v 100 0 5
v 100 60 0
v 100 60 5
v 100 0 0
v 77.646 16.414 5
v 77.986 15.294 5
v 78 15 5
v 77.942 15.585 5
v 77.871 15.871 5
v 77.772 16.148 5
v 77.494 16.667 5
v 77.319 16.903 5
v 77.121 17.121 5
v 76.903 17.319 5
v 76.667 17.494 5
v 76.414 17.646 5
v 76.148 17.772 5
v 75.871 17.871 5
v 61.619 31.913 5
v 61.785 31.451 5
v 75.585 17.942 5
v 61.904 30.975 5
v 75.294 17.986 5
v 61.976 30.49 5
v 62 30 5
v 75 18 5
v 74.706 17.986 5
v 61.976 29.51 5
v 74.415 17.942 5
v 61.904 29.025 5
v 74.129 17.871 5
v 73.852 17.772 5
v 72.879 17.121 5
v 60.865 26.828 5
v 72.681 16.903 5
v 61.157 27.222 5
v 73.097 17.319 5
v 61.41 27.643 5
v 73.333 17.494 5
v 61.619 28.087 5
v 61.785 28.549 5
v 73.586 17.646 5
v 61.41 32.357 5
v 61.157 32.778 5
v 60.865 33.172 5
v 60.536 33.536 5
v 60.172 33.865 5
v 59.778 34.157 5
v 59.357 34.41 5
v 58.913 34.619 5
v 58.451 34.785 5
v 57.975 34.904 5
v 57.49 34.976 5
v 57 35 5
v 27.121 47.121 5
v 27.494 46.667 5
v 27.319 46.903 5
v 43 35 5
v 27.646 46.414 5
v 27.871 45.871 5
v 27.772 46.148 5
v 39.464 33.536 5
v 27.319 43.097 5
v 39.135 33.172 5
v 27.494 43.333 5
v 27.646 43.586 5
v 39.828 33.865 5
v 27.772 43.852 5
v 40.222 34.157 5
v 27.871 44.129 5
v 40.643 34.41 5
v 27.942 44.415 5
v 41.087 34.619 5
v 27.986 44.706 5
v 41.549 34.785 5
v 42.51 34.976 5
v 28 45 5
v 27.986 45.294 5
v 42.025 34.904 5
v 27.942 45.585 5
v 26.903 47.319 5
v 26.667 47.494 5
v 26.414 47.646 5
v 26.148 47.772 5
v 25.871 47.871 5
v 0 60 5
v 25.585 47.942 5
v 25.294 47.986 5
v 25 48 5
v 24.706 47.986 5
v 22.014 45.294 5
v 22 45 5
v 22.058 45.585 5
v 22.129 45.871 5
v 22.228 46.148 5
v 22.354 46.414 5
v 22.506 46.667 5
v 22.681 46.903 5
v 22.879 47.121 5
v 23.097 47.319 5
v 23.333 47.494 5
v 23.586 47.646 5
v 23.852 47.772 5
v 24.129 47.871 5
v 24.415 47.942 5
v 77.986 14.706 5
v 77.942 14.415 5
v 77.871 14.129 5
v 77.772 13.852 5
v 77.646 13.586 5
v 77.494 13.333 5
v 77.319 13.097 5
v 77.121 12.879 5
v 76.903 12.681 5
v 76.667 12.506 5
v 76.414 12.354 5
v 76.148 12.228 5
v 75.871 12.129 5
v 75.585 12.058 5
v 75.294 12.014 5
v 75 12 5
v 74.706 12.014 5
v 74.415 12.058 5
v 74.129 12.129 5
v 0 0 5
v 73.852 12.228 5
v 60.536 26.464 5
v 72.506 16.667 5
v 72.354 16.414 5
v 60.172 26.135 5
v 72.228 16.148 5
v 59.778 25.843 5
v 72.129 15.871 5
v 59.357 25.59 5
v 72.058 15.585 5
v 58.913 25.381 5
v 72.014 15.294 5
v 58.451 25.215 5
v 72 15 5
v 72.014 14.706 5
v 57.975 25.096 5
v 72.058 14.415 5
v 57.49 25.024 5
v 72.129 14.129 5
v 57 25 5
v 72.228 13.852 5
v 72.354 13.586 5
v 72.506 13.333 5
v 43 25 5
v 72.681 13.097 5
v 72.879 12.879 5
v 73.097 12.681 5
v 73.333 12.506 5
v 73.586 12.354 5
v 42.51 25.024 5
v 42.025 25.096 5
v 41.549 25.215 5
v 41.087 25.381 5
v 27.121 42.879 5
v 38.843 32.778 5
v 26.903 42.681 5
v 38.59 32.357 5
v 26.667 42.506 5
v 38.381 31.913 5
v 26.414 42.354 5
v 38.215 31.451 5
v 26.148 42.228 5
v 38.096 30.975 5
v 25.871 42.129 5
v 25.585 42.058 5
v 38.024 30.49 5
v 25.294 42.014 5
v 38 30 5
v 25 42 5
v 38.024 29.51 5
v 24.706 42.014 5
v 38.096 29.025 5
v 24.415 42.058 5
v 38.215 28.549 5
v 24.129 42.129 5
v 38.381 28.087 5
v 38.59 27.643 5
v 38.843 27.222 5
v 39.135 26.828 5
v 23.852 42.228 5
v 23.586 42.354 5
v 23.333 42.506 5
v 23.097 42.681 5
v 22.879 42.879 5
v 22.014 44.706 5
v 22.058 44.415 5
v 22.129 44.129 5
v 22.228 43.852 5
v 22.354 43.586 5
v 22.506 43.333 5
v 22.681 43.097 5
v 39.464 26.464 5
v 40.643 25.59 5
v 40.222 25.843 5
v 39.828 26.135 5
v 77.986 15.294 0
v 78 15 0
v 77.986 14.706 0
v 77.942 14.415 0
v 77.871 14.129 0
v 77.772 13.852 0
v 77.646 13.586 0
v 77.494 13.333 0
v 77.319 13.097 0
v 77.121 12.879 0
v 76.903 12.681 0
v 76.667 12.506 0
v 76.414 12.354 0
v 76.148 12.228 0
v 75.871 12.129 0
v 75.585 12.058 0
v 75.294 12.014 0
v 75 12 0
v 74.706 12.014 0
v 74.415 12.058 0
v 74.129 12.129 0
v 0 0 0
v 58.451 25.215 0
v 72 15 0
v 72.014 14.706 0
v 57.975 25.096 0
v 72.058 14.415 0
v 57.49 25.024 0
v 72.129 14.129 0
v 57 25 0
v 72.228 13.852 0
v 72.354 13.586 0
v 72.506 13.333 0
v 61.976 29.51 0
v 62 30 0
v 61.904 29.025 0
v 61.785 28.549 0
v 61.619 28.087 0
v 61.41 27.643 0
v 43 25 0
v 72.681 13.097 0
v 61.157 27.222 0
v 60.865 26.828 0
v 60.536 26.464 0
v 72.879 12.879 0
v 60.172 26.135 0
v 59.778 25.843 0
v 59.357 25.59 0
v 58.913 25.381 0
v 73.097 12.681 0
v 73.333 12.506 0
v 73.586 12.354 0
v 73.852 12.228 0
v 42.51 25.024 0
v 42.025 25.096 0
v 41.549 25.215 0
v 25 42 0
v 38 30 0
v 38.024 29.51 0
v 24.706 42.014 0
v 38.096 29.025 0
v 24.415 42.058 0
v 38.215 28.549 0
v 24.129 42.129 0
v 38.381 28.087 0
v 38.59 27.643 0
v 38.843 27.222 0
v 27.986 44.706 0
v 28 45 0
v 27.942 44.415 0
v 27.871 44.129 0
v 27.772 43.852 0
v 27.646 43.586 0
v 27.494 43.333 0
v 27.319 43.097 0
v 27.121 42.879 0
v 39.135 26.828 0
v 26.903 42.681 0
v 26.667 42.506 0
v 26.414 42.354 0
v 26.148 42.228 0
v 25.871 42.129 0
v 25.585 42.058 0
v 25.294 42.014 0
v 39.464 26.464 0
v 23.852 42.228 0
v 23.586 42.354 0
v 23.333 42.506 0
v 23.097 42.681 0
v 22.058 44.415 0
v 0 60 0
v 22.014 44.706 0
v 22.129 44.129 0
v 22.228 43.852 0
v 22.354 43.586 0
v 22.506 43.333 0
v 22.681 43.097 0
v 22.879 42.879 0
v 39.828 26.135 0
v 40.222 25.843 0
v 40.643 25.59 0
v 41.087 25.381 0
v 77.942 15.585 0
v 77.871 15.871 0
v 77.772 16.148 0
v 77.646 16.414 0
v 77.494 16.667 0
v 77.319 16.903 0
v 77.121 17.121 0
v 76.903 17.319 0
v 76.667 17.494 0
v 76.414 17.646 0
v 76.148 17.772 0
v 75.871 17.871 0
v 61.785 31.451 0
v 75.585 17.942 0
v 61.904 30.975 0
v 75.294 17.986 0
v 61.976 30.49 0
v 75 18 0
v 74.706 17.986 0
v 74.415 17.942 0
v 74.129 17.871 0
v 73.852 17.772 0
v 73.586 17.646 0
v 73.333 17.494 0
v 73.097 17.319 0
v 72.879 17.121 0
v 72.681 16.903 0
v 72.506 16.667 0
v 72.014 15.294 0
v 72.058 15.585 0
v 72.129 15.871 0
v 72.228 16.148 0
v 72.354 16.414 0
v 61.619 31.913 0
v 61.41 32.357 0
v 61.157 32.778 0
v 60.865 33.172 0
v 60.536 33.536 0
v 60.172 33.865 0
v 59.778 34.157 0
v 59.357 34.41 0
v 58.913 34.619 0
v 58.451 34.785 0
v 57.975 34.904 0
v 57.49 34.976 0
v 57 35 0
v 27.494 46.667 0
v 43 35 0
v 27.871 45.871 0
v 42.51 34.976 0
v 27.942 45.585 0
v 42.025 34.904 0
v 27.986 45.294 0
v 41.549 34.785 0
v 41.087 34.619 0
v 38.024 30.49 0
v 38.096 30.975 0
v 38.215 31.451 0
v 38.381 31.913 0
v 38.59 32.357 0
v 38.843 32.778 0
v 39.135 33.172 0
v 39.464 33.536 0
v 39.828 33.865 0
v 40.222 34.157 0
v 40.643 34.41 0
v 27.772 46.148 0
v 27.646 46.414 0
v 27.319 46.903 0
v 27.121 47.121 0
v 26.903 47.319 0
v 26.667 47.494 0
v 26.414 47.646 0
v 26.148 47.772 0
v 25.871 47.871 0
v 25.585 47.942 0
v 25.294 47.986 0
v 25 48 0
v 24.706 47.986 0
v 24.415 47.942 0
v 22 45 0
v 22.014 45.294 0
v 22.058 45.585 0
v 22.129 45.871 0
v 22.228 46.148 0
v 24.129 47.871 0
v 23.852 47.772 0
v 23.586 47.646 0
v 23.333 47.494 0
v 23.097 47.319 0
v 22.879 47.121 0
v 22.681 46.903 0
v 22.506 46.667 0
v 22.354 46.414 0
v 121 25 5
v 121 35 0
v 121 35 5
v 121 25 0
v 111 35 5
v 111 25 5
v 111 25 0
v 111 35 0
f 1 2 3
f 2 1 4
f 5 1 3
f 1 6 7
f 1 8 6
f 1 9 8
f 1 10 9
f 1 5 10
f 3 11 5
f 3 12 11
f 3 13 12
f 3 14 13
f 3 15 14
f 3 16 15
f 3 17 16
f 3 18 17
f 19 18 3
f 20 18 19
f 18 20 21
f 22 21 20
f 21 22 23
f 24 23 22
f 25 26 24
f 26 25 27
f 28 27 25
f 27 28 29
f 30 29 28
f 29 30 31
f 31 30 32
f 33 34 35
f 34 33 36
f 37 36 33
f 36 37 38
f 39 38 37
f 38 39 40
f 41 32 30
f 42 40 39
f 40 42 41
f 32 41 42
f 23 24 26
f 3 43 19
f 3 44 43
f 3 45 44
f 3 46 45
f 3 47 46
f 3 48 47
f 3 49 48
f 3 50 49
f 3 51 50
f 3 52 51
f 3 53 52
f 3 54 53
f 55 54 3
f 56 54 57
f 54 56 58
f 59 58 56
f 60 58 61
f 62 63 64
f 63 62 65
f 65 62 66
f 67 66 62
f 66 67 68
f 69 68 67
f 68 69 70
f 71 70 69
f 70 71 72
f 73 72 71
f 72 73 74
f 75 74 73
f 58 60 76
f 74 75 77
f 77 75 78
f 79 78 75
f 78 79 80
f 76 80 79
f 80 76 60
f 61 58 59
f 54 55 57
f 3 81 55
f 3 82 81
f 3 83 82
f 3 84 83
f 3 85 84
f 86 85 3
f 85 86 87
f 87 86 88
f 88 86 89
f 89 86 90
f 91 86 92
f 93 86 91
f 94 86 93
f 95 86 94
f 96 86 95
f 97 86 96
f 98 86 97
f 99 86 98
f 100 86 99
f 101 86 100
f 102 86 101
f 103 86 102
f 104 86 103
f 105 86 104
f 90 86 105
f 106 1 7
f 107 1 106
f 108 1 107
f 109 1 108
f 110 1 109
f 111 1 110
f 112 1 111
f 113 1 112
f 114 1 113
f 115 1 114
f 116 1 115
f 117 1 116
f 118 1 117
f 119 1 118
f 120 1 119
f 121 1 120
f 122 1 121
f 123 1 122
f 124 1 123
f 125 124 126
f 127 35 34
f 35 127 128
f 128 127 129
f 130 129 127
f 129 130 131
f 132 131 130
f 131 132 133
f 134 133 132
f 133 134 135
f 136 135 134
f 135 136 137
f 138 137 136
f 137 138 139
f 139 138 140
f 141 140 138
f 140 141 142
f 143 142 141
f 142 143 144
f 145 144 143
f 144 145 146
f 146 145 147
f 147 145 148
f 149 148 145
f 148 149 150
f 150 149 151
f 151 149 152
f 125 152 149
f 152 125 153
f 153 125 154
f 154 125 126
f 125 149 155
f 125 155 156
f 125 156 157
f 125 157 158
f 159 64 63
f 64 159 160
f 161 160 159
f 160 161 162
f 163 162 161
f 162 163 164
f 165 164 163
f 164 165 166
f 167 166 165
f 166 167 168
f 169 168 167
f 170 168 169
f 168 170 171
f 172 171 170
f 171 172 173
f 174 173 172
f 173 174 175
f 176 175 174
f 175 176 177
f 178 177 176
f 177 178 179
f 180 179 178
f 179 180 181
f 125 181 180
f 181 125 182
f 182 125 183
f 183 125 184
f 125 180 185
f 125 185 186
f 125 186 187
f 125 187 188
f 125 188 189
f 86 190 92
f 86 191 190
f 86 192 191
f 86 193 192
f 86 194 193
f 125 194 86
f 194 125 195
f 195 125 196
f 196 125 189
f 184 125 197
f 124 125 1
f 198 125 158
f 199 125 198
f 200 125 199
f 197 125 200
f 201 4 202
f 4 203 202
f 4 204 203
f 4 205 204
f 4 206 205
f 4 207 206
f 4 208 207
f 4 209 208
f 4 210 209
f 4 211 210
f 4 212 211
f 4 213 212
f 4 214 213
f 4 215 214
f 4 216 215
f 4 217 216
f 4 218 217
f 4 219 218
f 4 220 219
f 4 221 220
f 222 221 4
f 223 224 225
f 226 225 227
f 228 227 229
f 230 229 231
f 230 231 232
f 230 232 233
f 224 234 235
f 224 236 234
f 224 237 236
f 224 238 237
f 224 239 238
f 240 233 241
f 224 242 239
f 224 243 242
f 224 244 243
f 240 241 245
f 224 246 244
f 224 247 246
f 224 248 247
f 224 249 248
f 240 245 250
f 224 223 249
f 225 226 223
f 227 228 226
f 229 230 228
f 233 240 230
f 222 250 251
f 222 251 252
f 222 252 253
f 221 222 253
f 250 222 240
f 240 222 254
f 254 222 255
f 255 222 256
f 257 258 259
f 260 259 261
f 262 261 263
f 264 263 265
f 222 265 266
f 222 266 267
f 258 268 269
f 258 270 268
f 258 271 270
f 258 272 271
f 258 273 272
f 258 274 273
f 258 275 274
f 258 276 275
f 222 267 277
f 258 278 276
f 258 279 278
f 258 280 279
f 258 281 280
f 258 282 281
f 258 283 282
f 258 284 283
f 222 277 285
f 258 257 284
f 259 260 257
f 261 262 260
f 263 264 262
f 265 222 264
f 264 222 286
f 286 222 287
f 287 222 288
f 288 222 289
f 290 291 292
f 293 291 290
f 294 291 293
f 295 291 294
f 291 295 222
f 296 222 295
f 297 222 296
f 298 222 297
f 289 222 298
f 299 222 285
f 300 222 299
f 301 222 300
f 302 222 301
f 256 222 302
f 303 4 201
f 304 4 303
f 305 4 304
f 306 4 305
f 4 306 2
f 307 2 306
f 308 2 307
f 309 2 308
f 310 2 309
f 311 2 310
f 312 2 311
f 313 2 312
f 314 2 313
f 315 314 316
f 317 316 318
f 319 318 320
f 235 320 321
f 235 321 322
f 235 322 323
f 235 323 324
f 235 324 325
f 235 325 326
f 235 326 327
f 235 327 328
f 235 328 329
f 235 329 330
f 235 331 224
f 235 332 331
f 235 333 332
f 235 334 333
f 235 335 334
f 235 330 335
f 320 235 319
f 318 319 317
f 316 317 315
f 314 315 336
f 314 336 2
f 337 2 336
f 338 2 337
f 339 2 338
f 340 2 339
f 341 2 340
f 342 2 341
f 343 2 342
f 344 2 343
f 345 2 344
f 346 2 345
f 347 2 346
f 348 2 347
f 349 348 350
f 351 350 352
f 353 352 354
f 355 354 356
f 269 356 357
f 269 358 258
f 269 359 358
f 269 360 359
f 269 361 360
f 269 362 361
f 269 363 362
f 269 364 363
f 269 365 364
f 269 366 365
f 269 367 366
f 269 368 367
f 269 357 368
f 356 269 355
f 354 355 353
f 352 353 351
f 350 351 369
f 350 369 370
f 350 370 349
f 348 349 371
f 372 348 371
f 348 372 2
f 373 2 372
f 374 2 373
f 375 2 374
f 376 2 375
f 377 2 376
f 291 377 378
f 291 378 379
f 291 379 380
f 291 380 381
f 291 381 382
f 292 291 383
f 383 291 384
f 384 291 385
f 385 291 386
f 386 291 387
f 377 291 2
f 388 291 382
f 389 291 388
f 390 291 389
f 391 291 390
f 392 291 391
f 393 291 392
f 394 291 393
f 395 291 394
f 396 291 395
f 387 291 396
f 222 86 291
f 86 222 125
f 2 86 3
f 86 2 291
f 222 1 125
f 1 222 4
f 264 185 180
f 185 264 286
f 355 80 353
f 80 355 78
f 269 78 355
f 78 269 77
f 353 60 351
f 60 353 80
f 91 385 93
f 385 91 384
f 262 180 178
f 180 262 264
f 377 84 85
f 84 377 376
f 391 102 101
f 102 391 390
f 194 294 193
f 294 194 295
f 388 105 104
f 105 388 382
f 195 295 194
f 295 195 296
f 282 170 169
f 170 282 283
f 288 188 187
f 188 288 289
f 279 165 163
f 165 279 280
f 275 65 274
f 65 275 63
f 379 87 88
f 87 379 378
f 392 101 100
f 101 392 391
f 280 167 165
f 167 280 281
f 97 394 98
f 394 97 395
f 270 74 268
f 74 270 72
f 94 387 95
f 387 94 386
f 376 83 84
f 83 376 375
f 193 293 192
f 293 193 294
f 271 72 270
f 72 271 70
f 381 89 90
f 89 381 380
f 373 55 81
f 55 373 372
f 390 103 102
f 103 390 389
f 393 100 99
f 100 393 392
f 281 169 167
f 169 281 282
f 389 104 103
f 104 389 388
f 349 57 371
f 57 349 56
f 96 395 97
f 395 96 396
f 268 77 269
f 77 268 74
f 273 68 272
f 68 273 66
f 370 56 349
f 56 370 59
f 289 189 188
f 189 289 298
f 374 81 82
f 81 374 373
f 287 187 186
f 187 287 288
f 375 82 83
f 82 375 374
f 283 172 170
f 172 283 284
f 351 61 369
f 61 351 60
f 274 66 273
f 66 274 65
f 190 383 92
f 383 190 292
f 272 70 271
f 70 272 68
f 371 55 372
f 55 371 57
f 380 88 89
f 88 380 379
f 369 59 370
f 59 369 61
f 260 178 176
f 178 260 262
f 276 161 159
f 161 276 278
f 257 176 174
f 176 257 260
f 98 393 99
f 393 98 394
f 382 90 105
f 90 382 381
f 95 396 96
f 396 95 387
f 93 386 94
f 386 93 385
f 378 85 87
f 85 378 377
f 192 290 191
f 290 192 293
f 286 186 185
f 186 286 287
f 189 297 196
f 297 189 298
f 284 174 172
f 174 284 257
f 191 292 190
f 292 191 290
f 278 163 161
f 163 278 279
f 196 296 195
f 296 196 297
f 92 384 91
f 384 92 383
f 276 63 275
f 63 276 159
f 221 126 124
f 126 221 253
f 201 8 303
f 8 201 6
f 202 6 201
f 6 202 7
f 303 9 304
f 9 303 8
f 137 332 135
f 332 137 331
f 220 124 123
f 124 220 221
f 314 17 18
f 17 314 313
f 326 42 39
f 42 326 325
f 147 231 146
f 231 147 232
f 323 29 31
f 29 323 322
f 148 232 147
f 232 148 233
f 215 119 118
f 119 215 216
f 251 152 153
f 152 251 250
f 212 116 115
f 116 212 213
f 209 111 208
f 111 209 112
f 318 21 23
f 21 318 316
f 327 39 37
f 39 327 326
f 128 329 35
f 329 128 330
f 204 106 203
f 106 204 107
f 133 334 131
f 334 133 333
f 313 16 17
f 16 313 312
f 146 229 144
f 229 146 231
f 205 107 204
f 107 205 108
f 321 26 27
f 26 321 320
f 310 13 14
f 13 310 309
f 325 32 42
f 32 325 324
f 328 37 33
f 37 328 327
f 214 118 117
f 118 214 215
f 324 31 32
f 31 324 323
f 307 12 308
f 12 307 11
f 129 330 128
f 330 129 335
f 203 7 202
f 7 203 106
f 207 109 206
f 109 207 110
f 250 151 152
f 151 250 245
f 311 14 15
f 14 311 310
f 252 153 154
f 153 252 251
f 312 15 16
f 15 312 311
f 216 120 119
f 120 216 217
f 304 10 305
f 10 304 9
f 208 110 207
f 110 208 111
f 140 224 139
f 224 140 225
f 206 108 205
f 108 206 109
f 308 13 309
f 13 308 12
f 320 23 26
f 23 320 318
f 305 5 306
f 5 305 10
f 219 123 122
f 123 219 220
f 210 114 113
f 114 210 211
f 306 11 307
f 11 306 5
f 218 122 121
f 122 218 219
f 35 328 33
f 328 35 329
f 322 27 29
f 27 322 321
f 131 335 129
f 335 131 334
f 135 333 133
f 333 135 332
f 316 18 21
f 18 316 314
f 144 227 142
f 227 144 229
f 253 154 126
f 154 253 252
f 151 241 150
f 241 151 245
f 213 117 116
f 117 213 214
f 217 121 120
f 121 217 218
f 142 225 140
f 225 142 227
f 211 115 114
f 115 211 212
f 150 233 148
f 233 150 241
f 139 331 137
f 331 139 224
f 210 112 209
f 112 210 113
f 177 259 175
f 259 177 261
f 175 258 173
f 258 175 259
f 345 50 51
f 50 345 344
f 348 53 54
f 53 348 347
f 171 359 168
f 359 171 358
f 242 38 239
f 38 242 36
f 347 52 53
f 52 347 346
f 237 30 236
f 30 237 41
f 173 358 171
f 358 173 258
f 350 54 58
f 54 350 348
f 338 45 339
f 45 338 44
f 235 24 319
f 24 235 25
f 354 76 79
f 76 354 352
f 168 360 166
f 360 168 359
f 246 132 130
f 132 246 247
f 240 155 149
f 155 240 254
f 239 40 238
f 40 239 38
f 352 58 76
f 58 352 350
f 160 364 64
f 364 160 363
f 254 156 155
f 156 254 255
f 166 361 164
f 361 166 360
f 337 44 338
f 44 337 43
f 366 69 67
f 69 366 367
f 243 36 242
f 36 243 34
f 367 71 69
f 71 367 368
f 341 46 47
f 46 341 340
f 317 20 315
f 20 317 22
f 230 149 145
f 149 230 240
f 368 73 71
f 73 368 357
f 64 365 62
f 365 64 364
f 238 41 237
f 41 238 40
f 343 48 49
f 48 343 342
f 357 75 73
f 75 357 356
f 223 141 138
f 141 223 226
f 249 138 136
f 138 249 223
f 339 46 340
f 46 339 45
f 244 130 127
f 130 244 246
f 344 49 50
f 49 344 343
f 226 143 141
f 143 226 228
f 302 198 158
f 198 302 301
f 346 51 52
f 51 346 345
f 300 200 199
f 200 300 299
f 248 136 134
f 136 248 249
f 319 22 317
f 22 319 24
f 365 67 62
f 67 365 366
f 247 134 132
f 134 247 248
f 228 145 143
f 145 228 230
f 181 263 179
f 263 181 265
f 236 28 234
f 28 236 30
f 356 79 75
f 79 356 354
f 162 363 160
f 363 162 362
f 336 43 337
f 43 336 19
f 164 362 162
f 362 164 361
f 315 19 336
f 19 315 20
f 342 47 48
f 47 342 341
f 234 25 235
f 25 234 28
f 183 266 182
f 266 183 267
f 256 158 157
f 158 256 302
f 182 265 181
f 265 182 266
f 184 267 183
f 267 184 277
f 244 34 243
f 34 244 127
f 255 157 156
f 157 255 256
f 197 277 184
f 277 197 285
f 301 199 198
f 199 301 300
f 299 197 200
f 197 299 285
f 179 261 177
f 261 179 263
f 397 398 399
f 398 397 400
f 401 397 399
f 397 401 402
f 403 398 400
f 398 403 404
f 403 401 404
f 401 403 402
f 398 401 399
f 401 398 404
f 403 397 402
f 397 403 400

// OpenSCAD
// fixture D5 (planted defect): a body DISCONNECTED from the plate
// (a 10x10x5 tab standing 1 mm clear of the right edge).
// declared detector: build_success (components == 1 requirement)
// must remain stable: nothing else is evaluated (multi-component rows carry
// genus/volume as non-verdict fields)
$fn = 64;
union() {
  difference() {
    cube([100, 60, 5]);
    translate([25, 45, -1]) cylinder(d = 6, h = 7);
    translate([75, 15, -1]) cylinder(d = 6, h = 7);
    translate([50, 30, -1])
      linear_extrude(height = 7)
        hull() {
          translate([-(24 - 10) / 2, 0]) circle(d = 10);
          translate([(24 - 10) / 2, 0]) circle(d = 10);
        }
  }
  translate([111, 25, 0]) cube([10, 10, 5]);          // 1 mm gap -> two bodies
}
